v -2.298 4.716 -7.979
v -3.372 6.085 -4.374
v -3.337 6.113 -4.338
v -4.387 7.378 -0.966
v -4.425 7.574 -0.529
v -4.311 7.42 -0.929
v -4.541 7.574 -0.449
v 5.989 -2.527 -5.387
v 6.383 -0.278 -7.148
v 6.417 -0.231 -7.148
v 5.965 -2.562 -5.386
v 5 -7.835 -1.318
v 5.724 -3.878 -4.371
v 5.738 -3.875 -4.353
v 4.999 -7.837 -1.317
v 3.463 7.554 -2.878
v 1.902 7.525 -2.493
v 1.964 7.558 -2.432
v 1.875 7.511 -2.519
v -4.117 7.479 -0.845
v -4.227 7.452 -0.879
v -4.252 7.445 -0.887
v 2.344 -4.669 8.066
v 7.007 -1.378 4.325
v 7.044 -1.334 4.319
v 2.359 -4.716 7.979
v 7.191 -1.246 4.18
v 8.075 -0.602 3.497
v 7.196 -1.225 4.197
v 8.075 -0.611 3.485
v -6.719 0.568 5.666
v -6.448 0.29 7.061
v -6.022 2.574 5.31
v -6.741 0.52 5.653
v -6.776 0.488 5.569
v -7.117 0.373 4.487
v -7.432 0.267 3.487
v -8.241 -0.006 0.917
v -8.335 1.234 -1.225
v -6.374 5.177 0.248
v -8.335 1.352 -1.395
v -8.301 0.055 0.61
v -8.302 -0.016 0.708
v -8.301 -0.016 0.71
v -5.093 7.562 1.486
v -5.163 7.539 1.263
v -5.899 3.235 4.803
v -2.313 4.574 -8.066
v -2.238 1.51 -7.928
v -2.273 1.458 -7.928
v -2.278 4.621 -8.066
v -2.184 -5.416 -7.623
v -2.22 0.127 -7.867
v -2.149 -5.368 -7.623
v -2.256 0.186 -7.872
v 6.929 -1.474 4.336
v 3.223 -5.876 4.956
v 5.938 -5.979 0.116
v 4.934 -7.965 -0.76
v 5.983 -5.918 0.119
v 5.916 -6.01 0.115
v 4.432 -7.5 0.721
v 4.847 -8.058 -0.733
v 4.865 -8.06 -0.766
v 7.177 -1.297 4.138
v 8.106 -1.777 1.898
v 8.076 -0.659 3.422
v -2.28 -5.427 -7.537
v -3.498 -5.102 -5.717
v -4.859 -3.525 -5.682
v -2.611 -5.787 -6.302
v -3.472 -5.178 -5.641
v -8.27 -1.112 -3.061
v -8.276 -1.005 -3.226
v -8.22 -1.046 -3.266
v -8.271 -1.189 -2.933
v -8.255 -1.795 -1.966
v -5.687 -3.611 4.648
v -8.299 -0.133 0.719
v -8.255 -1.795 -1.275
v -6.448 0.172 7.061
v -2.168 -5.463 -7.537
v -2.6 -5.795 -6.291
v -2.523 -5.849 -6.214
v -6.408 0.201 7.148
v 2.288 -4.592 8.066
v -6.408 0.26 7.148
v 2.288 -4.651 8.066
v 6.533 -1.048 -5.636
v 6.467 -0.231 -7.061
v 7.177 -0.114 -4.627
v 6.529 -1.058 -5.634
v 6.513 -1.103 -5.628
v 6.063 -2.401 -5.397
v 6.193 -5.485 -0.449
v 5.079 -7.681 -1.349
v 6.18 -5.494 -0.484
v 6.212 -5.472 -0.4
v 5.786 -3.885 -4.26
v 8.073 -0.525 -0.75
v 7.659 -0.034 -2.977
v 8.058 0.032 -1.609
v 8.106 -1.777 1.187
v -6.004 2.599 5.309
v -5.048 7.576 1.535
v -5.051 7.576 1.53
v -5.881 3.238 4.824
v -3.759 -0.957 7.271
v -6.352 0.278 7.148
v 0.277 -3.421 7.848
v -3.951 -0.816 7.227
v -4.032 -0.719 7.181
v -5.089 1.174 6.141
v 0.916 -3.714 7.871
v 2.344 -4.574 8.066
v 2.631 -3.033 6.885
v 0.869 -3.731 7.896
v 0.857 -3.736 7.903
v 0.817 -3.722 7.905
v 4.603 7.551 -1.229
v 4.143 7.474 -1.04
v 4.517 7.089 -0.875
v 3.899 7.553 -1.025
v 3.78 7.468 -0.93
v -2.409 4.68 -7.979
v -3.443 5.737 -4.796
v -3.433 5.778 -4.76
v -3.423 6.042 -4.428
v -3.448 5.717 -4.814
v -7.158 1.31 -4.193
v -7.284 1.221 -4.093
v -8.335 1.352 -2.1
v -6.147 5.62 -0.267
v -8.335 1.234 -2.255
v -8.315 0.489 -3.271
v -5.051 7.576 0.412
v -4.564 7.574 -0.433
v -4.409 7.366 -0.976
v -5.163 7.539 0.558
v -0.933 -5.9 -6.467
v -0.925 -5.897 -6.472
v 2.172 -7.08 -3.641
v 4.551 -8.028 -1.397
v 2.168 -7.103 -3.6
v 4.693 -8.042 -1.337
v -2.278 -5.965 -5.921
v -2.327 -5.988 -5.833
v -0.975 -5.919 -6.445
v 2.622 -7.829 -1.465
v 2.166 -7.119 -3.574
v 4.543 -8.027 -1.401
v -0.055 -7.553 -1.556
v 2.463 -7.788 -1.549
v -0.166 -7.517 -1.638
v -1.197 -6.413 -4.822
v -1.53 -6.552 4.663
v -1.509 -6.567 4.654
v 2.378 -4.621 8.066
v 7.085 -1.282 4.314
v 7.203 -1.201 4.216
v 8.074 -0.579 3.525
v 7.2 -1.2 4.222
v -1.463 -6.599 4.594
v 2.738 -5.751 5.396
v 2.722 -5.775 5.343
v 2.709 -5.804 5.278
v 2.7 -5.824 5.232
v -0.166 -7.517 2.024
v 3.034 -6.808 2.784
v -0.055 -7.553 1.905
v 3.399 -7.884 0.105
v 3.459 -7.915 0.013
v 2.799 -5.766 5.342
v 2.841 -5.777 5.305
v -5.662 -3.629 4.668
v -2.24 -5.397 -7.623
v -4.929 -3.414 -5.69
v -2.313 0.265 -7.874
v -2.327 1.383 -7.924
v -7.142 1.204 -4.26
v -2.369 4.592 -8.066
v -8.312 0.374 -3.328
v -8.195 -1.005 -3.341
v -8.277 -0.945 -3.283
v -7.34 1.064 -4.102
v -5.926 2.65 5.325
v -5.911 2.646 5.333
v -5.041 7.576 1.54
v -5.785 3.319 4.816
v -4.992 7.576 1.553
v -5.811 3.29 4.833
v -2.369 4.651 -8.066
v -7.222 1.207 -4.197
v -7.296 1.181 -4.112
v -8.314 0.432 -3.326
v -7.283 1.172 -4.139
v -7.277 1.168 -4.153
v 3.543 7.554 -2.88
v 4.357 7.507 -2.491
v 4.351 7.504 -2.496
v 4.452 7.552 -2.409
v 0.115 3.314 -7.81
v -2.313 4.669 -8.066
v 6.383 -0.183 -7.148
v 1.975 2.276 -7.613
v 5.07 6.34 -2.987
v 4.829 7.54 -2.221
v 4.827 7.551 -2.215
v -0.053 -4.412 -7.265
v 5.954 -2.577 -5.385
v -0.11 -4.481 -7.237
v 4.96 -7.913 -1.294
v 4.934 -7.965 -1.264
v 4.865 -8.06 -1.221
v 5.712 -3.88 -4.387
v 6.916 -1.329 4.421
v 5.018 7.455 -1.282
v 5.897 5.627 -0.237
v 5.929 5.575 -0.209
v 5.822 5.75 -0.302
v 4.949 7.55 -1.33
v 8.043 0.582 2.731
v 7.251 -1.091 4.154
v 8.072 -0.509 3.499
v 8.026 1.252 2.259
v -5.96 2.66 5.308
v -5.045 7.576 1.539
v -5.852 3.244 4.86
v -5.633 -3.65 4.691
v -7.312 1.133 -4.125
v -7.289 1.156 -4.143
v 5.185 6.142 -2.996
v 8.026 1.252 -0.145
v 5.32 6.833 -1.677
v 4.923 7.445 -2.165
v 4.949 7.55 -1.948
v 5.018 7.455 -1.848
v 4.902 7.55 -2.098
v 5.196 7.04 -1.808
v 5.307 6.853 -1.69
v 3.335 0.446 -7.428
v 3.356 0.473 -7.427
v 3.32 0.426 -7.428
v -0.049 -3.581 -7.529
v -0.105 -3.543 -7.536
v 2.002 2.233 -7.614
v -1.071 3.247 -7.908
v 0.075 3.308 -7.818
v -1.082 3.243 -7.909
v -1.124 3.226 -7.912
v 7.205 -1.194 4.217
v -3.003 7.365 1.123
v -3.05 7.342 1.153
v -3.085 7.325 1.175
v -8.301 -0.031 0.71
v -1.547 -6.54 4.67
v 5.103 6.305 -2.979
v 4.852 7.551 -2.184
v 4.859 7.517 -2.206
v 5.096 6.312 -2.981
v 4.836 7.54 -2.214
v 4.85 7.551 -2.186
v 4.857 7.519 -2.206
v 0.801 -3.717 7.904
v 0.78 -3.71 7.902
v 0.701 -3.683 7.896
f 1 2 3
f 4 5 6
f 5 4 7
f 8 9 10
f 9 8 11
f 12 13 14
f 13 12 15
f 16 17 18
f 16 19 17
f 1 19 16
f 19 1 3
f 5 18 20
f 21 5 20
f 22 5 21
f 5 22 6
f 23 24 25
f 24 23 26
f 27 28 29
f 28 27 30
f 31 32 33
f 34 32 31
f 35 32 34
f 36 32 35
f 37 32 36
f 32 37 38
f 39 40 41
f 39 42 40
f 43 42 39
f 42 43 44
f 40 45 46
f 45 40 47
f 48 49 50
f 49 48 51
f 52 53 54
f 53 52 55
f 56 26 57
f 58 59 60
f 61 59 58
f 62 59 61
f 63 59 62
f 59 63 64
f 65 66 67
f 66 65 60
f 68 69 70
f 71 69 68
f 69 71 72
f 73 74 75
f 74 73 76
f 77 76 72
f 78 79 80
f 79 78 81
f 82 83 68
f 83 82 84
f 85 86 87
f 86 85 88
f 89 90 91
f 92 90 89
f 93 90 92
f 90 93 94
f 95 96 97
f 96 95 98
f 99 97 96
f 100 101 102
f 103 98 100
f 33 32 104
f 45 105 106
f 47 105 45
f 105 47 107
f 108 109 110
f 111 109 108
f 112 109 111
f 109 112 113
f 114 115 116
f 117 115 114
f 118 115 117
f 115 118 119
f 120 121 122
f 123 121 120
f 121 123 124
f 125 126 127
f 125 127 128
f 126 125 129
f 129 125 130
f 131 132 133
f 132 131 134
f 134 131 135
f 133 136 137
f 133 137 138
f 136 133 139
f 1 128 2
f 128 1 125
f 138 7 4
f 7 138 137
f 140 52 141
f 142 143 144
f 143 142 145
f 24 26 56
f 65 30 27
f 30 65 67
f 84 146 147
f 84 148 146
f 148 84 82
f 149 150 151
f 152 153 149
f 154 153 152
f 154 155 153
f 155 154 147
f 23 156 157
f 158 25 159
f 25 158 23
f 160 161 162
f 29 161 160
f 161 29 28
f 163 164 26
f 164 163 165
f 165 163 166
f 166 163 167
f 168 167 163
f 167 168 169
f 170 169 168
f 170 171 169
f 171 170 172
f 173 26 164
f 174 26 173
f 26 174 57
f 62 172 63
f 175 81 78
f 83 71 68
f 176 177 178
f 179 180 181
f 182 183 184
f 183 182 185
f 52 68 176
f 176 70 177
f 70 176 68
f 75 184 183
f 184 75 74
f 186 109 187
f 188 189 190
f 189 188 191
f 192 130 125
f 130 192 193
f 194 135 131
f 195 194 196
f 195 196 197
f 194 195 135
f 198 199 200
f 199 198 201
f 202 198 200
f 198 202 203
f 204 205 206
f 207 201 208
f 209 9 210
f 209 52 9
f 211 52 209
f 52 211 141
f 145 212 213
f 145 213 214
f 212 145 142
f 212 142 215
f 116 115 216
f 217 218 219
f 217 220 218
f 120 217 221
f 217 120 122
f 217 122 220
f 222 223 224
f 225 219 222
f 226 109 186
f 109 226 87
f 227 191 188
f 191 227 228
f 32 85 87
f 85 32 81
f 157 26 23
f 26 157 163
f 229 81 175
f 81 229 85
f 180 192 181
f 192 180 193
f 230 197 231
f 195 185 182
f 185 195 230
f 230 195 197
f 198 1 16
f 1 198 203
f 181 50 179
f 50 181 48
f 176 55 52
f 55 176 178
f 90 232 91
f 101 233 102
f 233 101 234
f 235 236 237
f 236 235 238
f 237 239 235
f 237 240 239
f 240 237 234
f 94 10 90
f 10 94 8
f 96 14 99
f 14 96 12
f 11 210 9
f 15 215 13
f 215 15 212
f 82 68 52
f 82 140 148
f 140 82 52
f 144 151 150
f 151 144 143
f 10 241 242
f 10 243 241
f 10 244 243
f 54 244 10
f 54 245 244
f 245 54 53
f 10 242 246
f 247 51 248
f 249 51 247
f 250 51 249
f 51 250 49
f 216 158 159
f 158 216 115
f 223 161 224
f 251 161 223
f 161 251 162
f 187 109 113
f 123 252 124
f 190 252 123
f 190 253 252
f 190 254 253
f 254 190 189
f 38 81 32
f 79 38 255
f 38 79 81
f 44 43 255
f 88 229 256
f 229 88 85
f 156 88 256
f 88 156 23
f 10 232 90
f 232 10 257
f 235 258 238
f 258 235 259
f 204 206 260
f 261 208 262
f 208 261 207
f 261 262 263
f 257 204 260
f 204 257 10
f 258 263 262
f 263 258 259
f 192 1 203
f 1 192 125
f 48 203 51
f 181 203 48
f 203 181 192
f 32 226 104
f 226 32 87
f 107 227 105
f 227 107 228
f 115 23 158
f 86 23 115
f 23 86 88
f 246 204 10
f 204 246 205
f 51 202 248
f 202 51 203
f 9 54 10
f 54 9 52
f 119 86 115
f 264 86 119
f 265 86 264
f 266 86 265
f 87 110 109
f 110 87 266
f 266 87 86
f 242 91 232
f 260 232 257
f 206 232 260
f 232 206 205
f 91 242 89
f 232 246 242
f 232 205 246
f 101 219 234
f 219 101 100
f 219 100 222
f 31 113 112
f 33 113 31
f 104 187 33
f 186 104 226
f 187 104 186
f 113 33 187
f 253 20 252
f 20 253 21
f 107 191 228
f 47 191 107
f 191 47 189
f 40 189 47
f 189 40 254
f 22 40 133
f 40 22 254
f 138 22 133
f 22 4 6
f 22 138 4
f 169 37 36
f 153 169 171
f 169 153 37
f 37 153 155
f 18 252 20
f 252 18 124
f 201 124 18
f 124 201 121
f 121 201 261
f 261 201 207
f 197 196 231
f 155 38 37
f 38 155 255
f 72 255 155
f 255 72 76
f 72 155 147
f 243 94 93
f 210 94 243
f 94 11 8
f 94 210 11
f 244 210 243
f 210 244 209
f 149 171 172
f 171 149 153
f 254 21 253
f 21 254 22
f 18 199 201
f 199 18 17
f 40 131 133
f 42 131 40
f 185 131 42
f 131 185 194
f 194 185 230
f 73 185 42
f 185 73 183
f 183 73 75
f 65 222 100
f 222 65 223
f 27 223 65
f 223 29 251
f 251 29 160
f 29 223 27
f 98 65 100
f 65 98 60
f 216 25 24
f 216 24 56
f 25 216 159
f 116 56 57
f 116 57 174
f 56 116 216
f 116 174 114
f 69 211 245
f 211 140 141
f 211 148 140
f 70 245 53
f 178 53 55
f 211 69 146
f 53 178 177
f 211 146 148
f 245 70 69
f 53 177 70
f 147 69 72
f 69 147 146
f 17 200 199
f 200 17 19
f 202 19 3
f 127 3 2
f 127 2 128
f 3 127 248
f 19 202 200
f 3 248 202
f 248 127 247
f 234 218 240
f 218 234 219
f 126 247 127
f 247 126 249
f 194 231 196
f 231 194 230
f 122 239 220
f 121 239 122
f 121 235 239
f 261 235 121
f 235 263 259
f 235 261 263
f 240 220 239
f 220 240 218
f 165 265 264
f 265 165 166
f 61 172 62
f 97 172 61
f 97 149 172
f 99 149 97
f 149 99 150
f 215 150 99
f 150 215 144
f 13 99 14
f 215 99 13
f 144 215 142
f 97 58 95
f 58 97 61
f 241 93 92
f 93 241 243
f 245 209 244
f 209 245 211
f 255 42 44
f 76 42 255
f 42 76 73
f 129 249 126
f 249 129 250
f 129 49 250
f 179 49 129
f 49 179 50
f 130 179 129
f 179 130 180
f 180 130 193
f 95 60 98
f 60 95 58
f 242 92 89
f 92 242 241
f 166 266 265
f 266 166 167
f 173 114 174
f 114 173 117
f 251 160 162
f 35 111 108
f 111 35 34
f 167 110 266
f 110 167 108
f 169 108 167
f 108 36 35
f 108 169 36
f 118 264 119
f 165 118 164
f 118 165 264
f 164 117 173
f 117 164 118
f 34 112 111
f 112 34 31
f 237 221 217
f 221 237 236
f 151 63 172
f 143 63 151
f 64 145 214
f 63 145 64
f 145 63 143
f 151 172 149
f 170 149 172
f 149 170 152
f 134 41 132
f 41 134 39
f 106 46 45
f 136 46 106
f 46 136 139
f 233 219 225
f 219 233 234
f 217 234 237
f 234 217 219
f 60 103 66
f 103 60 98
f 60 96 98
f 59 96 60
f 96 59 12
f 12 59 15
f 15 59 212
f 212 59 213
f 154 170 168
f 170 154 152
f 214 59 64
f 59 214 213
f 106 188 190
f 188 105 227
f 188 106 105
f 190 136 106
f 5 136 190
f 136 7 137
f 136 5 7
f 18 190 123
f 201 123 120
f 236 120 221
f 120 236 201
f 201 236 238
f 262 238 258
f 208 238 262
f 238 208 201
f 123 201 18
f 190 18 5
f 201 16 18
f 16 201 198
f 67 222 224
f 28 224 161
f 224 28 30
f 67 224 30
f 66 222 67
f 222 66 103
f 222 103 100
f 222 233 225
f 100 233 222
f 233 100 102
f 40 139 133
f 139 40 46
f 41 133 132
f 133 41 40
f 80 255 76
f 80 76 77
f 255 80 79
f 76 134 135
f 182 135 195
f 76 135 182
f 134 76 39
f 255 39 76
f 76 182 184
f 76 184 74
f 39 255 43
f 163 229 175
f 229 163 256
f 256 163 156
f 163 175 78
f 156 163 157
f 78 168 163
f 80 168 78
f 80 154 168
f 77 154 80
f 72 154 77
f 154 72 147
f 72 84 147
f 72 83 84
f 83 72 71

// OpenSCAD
// Auto-generated OpenSCAD file

    inner_points = 10*[[0.48336147006620667, -0.796491443485512, 0.24961052401954548], [-0.0033636129242731877, 0.20724337779290775, -0.9224172448029275], [-0.02146243534842994, -0.25567359892911584, 0.9224172448029275], [-0.5081875183389098, 0.7480612223493041, -0.24961052401954548], [0.8005548202773529, -0.17771619883438955, -0.46907269909671206], [-0.008558631255711907, -0.7457756765165251, -0.6195514429901602], [-0.01626741701699122, 0.6973454553803171, 0.6195514429901602], [-0.8253808685500561, 0.12928597769818145, 0.46907269909671206], [0.7925798307638832, 0.1251835430715676, 0.4839163595474912], [0.49176718629865324, 0.7455257783134321, -0.24043663734350143], [-0.8174058790365863, -0.1736137642077757, -0.4839163595474912]];

    outer_points = 10*[[0.46952448230116467, 0.8081551775499222, -0.1758990241773695], [0.49043976285885654, -0.8081551775499222, -0.10422353473988513], [-0.49043976285885654, 0.8081551775499222, 0.10422353473988513], [-0.46952448230116467, -0.8081551775499222, 0.1758990241773695], [0.6367153111321443, -0.02307267632934869, -0.7060947254896978], [0.9165394655214069, 0.02307267632934869, 0.2528469041459849], [-0.9165394655214069, -0.02307267632934869, -0.2528469041459849], [-0.6367153111321443, 0.02307267632934869, 0.7060947254896978], [-0.23284567347195917, 0.4621349933977465, -0.7979490193051987], [-0.2199193192030657, -0.5367997424223692, -0.7536511306725492], [0.23284567347195917, -0.4621349933977465, 0.7979490193051987]];

    // Convex hull for inner set (I)
    module inner_hull() {
        hull() {
            for (p = inner_points) {
                translate(p) sphere(r=0.1);
            }
        }
    }

    // Convex hull for outer set (O) minus inner hull (O \ I)
    module outer_minus_inner() {
        difference() {
            hull() {
                for (p = outer_points) {
                    translate(p) sphere(r=0.1);
                }
            }
            inner_hull(); // Subtract inner hull
        }
    }

    // Convex hull for outer set (O) minus all translated inner hulls
    module outer_minus_AllTranslationInner() {
        difference() {
            hull() {
                for (p = outer_points) {
                    translate(p) sphere(r=0.1);
                }
            }
            hull() {
                translate([0,0,50]) inner_hull();
                translate([0,0,-50]) inner_hull();
            }; // Subtract translated inner hulls
        }
    }

    // Difference between outer_minus_inner and outer_minus_AllTranslationInner
    module outer_minus_inner_diff() {
        difference() {
            // Outer minus inner
            difference() {
                hull() {
                    for (p = outer_points) {
                        translate(p) sphere(r=0.1);
                    }
                }
                inner_hull();
            }

            // Subtract Outer minus AllTranslationInner
            difference() {
                hull() {
                    for (p = outer_points) {
                        translate(p) sphere(r=0.1);
                    }
                }
                hull() {
                    translate([0,0,50]) inner_hull();
                    translate([0,0,-50]) inner_hull();
                };
            }
        }
    }

    // Rendering all with colors applied
    color([1, 1, 0, 1]) outer_minus_inner_diff(); // Opaque yellow
    
